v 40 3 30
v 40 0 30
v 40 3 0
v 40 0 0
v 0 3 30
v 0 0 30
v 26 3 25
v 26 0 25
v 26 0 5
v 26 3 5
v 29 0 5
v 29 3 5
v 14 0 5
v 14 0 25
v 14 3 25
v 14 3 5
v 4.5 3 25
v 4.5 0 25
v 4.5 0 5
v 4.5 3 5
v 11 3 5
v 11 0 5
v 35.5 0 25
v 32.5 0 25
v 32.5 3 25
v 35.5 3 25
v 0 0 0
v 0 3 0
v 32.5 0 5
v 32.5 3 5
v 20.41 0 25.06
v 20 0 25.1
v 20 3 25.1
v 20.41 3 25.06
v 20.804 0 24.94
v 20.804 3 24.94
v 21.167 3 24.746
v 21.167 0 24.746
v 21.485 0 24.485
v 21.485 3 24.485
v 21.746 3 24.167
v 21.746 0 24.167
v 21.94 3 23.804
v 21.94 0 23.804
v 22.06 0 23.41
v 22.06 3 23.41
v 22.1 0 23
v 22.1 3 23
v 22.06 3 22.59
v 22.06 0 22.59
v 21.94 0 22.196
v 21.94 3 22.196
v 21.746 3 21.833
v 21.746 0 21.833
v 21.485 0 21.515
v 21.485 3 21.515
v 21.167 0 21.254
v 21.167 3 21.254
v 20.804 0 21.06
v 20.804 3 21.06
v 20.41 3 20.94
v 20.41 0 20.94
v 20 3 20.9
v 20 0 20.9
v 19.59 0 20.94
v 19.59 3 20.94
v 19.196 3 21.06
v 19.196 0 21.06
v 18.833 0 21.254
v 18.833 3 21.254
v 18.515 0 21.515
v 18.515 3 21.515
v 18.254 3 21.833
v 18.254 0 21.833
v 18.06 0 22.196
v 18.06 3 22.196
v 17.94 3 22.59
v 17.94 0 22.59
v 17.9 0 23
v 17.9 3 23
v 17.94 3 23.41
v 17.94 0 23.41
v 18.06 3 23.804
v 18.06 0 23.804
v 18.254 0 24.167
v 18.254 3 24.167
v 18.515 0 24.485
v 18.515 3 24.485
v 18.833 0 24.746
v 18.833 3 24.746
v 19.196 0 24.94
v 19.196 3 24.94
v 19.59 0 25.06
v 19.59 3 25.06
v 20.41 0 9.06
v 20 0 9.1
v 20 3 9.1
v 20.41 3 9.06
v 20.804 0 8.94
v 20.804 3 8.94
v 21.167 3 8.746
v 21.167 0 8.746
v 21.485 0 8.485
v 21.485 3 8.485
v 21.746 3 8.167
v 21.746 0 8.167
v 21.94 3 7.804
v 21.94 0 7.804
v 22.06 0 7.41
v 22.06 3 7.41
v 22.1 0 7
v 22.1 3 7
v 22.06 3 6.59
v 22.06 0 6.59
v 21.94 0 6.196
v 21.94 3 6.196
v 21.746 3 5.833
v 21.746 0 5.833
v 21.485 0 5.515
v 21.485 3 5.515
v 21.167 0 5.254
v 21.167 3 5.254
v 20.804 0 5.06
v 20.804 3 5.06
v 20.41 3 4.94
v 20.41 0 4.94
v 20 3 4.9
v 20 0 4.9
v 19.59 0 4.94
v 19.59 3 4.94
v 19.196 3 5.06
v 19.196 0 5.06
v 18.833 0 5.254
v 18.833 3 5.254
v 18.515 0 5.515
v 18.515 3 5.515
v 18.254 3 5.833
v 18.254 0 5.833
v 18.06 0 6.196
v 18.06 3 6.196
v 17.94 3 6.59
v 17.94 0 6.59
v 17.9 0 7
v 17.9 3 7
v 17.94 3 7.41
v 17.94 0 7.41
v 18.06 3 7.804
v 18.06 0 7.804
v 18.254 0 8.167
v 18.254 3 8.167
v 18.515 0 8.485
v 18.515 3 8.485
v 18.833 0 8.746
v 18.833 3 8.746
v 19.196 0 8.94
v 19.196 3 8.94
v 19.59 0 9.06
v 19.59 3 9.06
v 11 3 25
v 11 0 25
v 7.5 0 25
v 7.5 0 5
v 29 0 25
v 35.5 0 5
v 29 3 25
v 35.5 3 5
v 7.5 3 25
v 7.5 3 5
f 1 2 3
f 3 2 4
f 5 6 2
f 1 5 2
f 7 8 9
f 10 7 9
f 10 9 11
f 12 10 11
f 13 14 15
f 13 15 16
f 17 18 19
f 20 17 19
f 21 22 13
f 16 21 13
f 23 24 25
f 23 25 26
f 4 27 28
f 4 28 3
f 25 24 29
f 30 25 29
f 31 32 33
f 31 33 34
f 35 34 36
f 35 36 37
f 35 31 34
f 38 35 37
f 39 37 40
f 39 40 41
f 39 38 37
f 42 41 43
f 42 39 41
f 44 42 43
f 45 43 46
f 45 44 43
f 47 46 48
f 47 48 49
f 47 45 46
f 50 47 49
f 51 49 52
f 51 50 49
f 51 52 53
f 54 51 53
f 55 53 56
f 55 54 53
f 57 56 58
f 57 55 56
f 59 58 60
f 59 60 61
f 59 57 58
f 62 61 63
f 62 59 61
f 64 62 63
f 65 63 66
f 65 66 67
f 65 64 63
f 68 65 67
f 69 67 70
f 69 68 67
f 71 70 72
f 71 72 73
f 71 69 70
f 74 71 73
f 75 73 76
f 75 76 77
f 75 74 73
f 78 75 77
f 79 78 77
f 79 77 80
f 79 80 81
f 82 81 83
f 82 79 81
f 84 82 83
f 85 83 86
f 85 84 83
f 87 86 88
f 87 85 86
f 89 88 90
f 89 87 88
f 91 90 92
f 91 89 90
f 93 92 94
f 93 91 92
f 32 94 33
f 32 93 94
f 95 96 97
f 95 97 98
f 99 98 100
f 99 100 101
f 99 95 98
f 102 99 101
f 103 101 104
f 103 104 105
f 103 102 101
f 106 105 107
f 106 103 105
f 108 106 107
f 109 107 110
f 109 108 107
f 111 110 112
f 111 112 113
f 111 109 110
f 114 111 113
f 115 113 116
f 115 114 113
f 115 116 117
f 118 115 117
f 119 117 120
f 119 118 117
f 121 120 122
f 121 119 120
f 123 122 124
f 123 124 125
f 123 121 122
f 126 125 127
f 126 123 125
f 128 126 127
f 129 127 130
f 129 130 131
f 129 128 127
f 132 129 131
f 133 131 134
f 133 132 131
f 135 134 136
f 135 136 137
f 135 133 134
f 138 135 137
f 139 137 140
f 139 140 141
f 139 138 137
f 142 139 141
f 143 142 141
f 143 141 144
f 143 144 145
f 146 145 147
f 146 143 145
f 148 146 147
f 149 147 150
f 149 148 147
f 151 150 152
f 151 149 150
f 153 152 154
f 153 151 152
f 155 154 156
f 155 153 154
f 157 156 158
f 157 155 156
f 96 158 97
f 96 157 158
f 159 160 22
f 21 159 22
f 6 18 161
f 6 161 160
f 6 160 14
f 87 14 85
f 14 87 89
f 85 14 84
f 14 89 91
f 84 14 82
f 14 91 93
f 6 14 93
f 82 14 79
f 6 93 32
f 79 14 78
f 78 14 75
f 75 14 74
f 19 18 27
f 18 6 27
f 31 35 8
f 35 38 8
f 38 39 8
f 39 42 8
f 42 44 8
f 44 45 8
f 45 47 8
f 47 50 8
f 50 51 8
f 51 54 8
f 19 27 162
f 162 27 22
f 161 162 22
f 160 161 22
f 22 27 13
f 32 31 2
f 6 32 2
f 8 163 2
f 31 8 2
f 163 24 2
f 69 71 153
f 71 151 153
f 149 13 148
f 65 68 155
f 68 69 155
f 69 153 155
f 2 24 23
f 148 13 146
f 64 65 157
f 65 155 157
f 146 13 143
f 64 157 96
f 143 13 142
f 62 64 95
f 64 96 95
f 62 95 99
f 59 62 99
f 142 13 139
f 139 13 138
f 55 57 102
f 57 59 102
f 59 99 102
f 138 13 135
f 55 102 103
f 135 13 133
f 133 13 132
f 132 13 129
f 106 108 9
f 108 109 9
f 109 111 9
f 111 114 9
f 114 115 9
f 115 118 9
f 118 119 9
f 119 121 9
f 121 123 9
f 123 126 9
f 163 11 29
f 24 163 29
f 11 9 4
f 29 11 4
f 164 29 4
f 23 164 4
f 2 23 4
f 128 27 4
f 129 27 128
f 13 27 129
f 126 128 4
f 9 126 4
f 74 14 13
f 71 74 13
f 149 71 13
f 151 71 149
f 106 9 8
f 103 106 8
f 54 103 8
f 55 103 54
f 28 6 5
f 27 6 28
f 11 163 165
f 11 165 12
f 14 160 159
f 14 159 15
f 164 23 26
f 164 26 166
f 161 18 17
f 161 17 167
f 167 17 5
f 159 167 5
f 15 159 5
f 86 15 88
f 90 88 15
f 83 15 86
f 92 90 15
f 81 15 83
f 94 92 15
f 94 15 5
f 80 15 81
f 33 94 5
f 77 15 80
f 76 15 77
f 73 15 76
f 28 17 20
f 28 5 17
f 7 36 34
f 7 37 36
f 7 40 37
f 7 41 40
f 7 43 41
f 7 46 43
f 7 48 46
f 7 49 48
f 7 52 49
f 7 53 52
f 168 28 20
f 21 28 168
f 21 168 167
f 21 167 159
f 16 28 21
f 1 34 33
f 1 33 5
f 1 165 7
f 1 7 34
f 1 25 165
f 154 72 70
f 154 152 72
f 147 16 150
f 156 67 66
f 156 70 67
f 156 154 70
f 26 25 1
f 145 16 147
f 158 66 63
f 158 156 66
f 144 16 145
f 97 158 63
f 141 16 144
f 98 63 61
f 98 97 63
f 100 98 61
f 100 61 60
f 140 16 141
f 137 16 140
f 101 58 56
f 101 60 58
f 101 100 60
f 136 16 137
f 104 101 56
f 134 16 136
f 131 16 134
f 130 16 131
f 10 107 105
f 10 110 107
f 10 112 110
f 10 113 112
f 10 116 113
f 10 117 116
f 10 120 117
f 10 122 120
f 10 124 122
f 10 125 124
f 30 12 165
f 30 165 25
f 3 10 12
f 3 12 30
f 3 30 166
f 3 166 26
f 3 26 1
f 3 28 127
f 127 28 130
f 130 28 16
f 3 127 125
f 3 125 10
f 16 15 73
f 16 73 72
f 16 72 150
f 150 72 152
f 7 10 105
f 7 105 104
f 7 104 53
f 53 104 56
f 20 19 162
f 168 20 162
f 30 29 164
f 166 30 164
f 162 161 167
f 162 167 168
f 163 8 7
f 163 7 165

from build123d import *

# Parameters (mm, degrees)
SKETCH_1_W      = 40
SKETCH_1_H      = 30
SKETCH_1_R      = 2.1
SKETCH_1_W_2    = 3
SKETCH_1_H_2    = 20
EXTRUDE_1_DEPTH = 3


with BuildPart() as part:
    # 草图1 → 凸台-拉伸1 (new body)
    with BuildSketch(Plane(origin=(0, 0, 0), x_dir=(1, 0, 0), z_dir=(0, 1, 0))):
        with Locations((20, -15)):
            Rectangle(SKETCH_1_W, SKETCH_1_H)
        with Locations(Location((20, -23, 0), (0, 0, 270))):
            Circle(SKETCH_1_R, mode=Mode.SUBTRACT)
        with Locations(Location((20, -7, 0), (0, 0, 270))):
            Circle(SKETCH_1_R, mode=Mode.SUBTRACT)
        with Locations((6, -15)):
            Rectangle(SKETCH_1_W_2, SKETCH_1_H_2, mode=Mode.SUBTRACT)
        with Locations((34, -15)):
            Rectangle(SKETCH_1_W_2, SKETCH_1_H_2, mode=Mode.SUBTRACT)
        with Locations((27.5, -15)):
            Rectangle(SKETCH_1_W_2, SKETCH_1_H_2, mode=Mode.SUBTRACT)
        with Locations((12.5, -15)):
            Rectangle(SKETCH_1_W_2, SKETCH_1_H_2, mode=Mode.SUBTRACT)
    extrude(amount=EXTRUDE_1_DEPTH)


solid = part.part
